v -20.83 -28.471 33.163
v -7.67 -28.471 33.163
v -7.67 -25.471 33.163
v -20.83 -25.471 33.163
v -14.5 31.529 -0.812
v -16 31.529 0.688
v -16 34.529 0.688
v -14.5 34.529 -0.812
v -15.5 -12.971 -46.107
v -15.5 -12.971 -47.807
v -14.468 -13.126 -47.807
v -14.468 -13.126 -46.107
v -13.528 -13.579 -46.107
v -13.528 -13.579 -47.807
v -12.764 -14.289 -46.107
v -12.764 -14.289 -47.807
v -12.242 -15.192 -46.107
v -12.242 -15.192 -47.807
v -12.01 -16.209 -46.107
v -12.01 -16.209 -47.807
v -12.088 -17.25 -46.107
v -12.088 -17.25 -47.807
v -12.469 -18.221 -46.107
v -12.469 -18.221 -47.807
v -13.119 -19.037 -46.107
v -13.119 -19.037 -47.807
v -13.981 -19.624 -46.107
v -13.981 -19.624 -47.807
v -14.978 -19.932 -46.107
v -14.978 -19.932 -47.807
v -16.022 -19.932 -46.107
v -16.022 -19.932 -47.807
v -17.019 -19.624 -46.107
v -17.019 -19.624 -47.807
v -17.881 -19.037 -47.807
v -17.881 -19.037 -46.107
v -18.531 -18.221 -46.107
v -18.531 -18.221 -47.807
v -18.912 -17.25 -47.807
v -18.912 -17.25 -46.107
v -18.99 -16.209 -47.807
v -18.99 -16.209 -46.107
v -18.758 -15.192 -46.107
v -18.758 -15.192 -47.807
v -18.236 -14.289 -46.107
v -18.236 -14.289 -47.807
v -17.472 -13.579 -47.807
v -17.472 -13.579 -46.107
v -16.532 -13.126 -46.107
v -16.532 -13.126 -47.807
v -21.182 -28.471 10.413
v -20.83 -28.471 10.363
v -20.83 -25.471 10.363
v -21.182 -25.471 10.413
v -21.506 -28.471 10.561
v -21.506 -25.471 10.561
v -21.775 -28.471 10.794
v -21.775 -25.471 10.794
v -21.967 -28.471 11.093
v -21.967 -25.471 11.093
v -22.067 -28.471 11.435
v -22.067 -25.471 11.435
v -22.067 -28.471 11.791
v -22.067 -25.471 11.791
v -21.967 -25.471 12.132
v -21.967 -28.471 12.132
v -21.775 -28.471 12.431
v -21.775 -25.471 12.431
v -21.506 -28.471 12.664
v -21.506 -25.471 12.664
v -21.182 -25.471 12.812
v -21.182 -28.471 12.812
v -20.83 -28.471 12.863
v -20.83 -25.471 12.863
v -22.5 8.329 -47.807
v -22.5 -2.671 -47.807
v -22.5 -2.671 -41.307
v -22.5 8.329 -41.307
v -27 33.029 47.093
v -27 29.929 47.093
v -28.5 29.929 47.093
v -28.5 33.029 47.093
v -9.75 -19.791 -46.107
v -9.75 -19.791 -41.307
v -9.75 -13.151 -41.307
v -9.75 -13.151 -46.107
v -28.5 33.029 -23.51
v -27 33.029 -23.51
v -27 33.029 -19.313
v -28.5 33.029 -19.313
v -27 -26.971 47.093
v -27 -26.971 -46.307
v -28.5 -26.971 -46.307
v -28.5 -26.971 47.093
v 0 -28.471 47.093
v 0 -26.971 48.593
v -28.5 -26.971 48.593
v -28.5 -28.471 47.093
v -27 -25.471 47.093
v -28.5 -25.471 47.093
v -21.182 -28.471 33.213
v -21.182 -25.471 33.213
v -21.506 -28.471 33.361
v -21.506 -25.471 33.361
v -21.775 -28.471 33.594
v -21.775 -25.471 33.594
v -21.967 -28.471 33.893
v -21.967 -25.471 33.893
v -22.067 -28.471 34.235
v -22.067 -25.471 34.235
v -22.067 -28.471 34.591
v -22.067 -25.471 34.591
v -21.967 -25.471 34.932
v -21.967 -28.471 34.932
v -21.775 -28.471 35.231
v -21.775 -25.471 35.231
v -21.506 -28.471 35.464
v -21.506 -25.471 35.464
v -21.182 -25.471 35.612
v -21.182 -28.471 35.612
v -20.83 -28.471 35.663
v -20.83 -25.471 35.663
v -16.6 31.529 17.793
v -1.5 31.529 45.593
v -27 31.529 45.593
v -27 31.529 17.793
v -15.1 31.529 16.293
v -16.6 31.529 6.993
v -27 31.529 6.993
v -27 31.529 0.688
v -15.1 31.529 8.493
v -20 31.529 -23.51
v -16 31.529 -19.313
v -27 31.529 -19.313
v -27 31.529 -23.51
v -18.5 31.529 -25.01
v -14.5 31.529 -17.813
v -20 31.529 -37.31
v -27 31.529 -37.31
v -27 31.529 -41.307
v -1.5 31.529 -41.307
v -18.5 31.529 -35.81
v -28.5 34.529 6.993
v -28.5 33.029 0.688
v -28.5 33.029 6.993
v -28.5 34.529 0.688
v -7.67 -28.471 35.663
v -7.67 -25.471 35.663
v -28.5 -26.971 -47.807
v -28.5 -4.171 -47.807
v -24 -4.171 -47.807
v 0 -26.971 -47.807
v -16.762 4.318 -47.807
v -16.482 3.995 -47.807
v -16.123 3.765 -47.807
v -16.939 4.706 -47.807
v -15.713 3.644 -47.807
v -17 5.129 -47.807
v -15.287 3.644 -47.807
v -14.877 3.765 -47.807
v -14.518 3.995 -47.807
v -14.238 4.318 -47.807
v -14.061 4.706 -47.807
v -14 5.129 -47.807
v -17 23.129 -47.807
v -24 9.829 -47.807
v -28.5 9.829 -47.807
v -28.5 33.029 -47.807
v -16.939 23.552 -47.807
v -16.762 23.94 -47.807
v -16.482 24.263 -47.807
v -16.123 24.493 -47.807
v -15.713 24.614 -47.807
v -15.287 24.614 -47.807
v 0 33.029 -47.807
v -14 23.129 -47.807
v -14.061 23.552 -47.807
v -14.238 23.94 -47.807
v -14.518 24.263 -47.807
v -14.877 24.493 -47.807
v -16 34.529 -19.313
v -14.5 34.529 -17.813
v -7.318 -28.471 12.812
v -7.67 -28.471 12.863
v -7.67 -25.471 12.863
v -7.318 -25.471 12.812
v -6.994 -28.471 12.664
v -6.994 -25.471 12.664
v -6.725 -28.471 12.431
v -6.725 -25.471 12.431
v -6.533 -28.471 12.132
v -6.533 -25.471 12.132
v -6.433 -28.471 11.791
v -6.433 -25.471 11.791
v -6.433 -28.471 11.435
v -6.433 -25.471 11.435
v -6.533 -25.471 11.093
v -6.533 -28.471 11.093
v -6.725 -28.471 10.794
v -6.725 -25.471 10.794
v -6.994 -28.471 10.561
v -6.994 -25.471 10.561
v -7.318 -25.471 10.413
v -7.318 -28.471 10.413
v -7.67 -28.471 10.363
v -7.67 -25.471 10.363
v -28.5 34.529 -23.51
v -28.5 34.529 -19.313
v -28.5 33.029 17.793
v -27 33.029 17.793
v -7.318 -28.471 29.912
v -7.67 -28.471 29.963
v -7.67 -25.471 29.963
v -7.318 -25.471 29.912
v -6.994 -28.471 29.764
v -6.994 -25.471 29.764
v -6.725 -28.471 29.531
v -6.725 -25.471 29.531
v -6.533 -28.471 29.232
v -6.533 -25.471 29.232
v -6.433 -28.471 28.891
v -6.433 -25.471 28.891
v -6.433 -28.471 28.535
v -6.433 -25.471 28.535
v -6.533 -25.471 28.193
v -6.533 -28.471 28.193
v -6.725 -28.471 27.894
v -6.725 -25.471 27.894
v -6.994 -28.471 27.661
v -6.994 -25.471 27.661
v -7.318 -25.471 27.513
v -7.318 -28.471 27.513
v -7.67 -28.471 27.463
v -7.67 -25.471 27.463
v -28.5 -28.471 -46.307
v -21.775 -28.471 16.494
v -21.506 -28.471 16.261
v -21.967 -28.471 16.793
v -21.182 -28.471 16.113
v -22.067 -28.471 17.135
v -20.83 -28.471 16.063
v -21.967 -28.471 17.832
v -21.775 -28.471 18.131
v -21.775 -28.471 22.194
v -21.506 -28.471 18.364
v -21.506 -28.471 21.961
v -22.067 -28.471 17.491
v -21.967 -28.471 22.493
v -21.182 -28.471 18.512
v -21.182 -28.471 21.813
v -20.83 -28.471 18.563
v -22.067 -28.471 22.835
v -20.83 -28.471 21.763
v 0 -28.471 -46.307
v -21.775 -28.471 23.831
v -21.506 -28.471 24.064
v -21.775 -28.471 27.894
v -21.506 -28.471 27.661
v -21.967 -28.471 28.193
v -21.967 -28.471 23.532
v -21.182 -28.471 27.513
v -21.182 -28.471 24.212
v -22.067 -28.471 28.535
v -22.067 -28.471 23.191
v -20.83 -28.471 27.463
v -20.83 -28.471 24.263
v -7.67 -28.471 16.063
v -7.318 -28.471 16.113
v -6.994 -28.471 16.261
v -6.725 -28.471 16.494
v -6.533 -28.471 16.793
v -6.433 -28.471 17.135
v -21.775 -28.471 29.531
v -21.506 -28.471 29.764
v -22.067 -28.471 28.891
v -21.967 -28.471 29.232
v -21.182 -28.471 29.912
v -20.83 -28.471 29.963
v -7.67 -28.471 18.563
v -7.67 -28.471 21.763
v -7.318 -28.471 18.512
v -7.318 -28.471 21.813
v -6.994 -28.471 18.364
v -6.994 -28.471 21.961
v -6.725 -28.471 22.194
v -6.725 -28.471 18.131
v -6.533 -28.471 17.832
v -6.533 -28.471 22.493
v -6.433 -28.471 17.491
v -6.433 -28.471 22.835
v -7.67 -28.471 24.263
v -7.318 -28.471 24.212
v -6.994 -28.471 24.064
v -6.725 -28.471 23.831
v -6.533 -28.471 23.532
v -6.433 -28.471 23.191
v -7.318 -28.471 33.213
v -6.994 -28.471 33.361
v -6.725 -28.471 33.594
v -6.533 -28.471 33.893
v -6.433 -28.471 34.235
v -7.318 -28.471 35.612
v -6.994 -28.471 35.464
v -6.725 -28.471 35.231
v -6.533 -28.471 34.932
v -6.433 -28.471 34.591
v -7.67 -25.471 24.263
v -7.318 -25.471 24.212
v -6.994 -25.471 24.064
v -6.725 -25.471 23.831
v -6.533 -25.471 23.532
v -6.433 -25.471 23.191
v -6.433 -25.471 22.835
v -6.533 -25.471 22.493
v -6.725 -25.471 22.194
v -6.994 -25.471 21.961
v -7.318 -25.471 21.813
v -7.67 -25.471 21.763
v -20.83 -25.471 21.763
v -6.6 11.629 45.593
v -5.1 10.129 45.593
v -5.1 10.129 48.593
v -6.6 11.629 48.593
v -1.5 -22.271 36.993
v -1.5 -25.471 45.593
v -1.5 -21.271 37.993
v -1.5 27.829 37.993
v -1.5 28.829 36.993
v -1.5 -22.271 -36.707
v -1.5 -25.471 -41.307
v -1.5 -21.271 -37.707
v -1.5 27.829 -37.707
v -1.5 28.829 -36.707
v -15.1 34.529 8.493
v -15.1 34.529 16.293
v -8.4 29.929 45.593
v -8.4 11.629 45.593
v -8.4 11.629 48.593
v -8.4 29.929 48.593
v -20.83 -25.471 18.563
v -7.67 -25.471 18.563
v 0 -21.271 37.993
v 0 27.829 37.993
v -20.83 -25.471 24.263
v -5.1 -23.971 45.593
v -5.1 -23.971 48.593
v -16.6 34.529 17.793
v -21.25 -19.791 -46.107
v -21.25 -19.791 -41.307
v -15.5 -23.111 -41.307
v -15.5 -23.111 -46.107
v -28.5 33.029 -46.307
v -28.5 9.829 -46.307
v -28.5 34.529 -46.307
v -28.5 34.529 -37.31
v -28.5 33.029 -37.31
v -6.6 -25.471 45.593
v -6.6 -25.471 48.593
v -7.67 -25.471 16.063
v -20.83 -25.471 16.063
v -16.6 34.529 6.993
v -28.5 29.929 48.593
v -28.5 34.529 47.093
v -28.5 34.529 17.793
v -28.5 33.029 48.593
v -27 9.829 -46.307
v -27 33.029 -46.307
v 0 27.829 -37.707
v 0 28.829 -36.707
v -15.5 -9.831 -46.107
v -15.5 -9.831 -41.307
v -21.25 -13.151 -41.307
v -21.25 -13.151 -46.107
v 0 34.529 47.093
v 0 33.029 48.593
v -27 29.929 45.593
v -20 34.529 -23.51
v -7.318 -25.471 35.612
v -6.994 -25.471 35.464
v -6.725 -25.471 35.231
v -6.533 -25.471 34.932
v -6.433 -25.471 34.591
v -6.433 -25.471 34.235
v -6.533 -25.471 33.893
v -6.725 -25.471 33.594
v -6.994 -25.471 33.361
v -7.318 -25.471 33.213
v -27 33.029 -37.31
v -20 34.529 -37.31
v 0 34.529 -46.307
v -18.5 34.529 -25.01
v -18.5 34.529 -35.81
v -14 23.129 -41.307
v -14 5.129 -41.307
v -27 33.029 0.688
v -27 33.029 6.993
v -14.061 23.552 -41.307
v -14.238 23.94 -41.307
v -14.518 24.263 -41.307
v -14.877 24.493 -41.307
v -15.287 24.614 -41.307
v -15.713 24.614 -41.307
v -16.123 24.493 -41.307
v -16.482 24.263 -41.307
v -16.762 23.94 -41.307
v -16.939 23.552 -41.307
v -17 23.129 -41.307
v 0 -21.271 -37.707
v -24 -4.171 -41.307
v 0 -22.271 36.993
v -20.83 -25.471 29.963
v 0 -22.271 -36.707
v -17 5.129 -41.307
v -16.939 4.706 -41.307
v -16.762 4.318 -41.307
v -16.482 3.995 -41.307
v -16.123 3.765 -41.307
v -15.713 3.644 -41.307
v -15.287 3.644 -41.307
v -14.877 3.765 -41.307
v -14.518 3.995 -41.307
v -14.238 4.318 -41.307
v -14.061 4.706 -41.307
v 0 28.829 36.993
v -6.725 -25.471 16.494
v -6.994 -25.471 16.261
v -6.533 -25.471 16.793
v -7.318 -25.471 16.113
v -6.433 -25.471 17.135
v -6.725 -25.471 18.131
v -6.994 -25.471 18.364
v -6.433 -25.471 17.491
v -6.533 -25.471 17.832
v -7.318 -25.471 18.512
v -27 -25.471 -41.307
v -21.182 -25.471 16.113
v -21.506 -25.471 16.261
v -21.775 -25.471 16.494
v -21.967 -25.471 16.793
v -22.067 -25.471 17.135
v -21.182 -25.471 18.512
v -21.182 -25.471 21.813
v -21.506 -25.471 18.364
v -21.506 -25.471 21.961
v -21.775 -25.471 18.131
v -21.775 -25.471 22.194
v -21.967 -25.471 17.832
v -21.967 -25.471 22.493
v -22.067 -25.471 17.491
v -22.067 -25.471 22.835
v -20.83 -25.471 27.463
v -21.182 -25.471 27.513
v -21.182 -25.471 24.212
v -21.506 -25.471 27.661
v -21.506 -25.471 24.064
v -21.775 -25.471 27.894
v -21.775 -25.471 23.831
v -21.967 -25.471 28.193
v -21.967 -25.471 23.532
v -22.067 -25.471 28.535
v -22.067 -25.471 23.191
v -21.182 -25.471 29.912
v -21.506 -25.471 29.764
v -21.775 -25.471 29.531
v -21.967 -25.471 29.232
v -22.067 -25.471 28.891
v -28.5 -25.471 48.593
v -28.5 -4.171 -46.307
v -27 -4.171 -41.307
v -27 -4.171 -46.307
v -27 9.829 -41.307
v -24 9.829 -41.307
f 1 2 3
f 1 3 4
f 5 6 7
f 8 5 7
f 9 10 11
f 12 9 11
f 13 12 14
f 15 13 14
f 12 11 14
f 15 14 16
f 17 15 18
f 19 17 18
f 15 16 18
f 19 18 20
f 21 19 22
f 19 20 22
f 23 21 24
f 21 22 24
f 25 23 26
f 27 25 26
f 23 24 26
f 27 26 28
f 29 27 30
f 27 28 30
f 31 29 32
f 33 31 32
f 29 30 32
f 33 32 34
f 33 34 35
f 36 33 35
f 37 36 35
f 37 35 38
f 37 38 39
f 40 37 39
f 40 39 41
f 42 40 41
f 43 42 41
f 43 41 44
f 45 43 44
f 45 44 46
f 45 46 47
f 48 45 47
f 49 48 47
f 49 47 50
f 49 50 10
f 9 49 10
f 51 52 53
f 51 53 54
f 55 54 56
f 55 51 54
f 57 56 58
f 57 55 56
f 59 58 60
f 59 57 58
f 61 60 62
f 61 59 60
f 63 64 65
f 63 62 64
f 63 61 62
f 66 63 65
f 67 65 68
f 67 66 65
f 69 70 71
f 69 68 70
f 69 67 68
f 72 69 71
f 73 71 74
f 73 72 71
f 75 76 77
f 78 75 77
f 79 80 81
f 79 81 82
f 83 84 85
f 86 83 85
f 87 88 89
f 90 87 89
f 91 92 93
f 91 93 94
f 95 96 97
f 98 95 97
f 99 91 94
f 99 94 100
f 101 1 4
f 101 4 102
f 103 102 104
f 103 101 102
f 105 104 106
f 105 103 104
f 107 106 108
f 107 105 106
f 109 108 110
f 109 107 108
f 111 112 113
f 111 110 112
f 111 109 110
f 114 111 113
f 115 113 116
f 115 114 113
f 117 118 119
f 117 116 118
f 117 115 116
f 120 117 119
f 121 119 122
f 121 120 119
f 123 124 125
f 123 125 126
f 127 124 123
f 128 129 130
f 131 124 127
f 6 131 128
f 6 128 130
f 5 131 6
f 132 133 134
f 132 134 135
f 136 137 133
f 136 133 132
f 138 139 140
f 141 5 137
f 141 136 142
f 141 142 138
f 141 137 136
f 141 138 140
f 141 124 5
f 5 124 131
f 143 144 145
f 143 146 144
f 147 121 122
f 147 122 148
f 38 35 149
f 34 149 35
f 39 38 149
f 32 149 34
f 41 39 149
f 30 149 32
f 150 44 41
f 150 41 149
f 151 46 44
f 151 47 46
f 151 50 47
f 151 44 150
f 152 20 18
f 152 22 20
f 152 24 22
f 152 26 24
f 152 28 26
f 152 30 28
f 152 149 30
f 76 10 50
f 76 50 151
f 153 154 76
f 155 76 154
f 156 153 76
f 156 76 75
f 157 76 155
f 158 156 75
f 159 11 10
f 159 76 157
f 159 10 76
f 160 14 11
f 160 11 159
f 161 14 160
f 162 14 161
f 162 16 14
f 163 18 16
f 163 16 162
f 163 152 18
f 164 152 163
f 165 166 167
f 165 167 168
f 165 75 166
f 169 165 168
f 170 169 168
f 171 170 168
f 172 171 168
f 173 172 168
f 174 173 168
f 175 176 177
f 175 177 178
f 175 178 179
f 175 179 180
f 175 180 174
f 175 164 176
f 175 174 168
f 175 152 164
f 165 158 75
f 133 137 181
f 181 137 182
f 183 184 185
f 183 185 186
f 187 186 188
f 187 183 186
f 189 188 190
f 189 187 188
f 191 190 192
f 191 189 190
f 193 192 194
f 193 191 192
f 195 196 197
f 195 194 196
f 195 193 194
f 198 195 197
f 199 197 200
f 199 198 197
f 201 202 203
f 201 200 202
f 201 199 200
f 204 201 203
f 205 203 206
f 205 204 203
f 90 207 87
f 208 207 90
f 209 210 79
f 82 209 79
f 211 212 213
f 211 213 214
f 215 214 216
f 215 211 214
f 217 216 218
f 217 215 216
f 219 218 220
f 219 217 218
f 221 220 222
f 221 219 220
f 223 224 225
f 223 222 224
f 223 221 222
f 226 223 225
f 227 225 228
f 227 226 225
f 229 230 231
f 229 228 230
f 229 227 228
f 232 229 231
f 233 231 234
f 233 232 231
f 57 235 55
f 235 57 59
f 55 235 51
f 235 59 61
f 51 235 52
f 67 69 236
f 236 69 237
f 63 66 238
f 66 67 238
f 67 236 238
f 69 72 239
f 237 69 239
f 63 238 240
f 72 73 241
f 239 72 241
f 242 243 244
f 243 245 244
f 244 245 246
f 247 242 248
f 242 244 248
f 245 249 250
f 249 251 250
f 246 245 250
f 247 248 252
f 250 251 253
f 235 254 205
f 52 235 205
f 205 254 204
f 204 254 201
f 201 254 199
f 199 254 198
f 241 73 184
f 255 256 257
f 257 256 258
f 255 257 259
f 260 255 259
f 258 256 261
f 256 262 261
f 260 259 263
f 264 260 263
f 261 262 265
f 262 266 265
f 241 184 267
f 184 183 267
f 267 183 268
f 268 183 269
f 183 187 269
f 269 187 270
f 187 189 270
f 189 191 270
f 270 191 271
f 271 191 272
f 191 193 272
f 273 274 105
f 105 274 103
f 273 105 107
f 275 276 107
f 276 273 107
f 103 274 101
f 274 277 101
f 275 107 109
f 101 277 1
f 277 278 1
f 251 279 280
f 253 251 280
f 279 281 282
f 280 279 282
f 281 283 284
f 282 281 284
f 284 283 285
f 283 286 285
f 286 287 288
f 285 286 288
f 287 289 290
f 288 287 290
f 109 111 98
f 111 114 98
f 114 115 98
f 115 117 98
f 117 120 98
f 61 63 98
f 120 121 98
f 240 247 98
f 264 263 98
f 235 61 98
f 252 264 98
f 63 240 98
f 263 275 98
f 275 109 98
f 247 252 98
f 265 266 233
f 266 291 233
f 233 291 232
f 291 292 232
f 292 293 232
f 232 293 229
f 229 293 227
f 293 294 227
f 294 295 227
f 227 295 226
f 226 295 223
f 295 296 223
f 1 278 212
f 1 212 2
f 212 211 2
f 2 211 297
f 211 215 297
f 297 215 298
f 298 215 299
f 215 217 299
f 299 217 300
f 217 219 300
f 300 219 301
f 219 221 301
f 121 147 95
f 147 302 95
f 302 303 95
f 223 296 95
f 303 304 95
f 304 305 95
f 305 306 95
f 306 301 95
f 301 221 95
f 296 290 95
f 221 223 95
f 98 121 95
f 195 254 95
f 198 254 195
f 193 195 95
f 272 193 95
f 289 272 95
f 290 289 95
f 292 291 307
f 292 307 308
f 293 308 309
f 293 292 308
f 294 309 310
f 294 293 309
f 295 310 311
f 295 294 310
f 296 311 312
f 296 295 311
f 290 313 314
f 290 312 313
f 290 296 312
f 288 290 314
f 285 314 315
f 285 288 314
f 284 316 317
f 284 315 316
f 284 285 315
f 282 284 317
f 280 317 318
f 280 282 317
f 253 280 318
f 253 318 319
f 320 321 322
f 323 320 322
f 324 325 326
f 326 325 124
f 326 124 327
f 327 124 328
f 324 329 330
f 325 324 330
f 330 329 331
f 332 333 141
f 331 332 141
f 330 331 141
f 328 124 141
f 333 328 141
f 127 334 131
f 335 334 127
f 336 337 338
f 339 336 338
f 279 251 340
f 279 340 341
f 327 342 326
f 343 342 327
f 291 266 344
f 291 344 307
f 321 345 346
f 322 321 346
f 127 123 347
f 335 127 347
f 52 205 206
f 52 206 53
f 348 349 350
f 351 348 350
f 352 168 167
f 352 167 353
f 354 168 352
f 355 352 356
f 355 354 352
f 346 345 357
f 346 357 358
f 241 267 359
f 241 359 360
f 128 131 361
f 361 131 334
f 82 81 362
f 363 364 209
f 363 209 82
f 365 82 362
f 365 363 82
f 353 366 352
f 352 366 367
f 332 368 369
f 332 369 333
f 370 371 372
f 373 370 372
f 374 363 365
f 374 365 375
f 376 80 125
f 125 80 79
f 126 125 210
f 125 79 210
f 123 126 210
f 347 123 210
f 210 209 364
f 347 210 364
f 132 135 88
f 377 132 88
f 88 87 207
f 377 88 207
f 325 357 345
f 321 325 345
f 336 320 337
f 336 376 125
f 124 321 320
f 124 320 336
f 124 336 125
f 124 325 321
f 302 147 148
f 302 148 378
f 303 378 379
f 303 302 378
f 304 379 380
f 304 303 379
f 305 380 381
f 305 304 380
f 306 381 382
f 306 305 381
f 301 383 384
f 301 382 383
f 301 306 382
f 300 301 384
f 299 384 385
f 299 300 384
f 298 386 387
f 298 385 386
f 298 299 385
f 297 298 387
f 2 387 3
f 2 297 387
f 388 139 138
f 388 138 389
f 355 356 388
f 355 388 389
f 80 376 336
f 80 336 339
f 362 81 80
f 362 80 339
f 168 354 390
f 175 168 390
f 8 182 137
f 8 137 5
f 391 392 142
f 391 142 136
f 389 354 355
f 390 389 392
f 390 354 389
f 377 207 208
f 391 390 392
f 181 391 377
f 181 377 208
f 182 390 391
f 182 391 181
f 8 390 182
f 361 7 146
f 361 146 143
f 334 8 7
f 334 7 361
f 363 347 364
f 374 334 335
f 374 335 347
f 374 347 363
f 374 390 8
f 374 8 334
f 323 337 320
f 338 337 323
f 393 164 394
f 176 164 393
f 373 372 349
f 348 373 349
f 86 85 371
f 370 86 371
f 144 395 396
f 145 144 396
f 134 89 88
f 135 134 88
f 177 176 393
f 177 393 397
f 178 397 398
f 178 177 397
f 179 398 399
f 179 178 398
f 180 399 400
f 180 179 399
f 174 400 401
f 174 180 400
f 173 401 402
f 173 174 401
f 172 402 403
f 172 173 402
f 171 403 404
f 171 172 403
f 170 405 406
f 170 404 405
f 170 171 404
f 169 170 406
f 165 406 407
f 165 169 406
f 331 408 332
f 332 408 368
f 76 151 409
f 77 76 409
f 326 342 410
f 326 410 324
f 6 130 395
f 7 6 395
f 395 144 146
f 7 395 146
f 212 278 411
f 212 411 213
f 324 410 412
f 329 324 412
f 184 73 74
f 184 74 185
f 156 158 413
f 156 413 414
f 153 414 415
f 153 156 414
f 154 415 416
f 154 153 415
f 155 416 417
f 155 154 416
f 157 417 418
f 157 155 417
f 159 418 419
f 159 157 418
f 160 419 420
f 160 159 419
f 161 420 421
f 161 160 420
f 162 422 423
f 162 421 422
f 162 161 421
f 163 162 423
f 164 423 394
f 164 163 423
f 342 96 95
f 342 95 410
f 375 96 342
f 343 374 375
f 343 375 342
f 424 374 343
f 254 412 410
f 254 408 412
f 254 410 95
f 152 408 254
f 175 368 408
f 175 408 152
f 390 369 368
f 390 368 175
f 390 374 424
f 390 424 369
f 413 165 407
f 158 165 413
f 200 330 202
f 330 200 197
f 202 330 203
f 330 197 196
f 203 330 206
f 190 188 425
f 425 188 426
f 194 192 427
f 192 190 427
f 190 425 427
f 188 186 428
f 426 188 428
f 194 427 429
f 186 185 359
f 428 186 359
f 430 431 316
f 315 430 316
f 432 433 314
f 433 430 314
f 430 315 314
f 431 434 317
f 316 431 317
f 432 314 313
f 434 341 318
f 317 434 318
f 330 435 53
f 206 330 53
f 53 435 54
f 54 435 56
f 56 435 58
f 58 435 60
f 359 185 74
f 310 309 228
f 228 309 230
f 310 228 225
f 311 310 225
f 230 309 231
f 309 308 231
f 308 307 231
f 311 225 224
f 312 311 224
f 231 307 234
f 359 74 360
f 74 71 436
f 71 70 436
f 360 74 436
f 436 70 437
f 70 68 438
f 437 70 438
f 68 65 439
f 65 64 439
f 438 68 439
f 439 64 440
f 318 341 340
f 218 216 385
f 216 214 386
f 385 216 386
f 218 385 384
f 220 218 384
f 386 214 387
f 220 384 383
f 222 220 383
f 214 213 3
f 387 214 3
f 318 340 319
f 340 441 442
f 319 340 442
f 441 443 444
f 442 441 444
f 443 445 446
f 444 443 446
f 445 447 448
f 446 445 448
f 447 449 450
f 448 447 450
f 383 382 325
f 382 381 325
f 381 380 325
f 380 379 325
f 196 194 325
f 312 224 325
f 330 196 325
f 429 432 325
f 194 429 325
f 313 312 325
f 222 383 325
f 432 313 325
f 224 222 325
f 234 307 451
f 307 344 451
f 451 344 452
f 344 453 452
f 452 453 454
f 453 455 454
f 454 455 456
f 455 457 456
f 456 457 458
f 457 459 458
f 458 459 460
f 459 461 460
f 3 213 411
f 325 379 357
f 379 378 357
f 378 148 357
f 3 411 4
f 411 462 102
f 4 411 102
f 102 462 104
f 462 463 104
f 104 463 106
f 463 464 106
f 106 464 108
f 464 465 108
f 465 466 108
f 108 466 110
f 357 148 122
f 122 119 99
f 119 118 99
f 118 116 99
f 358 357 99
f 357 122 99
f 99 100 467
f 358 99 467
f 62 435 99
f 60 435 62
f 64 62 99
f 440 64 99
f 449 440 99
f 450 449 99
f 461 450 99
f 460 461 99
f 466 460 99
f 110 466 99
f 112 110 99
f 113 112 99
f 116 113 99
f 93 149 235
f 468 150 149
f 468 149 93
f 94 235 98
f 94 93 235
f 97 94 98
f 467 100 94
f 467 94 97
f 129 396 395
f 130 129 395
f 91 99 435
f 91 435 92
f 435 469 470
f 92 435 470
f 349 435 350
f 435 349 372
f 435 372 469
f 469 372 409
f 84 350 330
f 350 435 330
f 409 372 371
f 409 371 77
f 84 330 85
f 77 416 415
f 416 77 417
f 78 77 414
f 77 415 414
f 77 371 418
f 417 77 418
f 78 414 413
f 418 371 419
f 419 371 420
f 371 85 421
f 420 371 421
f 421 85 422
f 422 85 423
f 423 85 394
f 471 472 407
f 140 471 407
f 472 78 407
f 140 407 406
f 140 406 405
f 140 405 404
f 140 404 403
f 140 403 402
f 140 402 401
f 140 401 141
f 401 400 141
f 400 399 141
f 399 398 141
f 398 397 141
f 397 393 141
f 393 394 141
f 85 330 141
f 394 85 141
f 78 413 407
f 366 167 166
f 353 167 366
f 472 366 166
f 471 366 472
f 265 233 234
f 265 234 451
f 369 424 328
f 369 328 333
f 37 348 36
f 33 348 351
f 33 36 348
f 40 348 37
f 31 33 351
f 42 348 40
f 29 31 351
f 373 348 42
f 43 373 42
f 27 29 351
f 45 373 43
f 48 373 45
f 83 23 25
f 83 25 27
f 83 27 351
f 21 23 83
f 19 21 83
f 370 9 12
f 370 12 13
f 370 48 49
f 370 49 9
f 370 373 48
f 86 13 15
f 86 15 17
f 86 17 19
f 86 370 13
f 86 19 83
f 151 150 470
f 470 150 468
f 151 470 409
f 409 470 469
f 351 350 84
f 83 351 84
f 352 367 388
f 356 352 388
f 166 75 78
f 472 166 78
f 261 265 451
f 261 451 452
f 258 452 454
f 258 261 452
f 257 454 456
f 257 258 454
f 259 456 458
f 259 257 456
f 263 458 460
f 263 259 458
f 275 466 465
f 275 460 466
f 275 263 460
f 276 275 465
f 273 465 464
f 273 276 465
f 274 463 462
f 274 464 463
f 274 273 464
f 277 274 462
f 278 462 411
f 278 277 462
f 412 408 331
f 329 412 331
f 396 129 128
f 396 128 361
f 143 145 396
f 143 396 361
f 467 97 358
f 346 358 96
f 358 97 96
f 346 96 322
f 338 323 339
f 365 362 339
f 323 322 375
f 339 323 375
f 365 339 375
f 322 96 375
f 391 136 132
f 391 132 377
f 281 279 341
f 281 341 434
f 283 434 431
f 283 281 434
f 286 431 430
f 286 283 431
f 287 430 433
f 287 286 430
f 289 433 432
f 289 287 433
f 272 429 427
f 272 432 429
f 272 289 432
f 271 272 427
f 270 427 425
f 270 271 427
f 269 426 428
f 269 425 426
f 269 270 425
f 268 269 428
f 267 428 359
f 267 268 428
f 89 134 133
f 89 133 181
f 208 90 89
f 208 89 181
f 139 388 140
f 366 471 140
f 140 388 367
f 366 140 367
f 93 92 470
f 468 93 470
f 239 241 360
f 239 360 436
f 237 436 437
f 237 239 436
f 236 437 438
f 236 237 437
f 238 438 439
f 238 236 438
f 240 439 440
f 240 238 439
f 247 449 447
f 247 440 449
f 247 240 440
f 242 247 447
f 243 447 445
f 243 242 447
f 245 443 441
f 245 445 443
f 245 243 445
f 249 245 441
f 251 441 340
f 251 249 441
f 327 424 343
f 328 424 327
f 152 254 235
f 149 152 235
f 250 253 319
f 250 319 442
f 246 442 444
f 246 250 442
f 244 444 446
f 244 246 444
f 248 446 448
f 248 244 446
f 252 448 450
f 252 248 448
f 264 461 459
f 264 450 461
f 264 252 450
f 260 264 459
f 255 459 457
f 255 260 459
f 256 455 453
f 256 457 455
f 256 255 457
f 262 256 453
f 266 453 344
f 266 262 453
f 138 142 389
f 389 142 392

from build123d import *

# Parameters (mm, degrees)
SKETCH2_W           = 86.9
SKETCH2_H           = 57
SKETCH2_W_2         = 75.7
SKETCH2_H_2         = 51.1
BOSS_EXTRUDE2_DEPTH = 1.5
SKETCH2_3_W         = 96.4
SKETCH2_3_H         = 63
SKETCH2_3_W_2       = 86.9
SKETCH2_3_H_2       = 57
BOSS_EXTRUDE3_DEPTH = 27
CHAMFER1_SIZE       = 1
SKETCH3_W           = 96.4
SKETCH3_H           = 63
SKETCH3_W_2         = 93.4
SKETCH3_H_2         = 60
BOSS_EXTRUDE4_DEPTH = 1.5
CHAMFER2_SIZE       = 1.5
SKETCH6_W           = 9.728035046
SKETCH6_H           = 14
CUT_EXTRUDE1_DEPTH  = 6
SKETCH10_W          = 3
SKETCH10_H          = 37.1
CUT_EXTRUDE2_DEPTH  = 23.4
SKETCH11_W          = 3.109966679
SKETCH11_H          = 18.3
CUT_EXTRUDE6_DEPTH  = 20.1
SKETCH12_W          = 13.8
SKETCH12_H          = 3.233091644
CUT_EXTRUDE7_DEPTH  = 10
SKETCH13_W          = 20.000720153
SKETCH13_H          = 4.04568645
CUT_EXTRUDE8_DEPTH  = 14
SKETCH15_W          = 10.8
SKETCH15_H          = 3.606090768
CUT_EXTRUDE9_DEPTH  = 13.4
CHAMFER3_SIZE       = 1.5
CHAMFER4_SIZE       = 1.5
CHAMFER5_SIZE       = 1.5
CHAMFER6_SIZE       = 1.5
CHAMFER7_SIZE       = 1.5
CUT_EXTRUDE11_DEPTH = 4
CUT_EXTRUDE12_DEPTH = 8
CUT_EXTRUDE13_DEPTH = 10
CUT_EXTRUDE14_DEPTH = 4.8


with BuildPart() as part:
    # Sketch2 → Boss-Extrude2 (new body)
    with BuildSketch(Plane(origin=(0, 0, 0), x_dir=(0, 0, -1), z_dir=(1, 0, 0))):
        with Locations((-2.142915598, 3.029012225)):
            Rectangle(SKETCH2_W, SKETCH2_H)
        with Locations((-0.142915598, 3.279012225)):
            Rectangle(SKETCH2_W_2, SKETCH2_H_2, mode=Mode.SUBTRACT)
    extrude(amount=-BOSS_EXTRUDE2_DEPTH)

    # Sketch2<3> → Boss-Extrude3 (add)
    with BuildSketch(Plane(origin=(0, 0, 0), x_dir=(0, 0, -1), z_dir=(1, 0, 0))):
        with Locations((-0.392915598, 3.029012225)):
            Rectangle(SKETCH2_3_W, SKETCH2_3_H)
        with Locations((-2.142915598, 3.029012225)):
            Rectangle(SKETCH2_3_W_2, SKETCH2_3_H_2, mode=Mode.SUBTRACT)
    extrude(amount=-BOSS_EXTRUDE3_DEPTH)

    # Chamfer1
    chamfer1_edges = [part.edges().sort_by_distance(p)[0] for p in [
        (-0.75, -22.270987775, -37.707084402),
        (-0.75, -22.270987775, 37.992915598),
        (-0.75, 28.829012225, 37.992915598),
        (-0.75, 28.829012225, -37.707084402),
    ]]
    chamfer(chamfer1_edges, length=CHAMFER1_SIZE)

    # Sketch3 → Boss-Extrude4 (add)
    with BuildSketch(Plane.ZY.offset(27)):
        with Locations((0.392915598, 3.029012225)):
            Rectangle(SKETCH3_W, SKETCH3_H)
        with Locations((0.392915598, 3.029012225)):
            Rectangle(SKETCH3_W_2, SKETCH3_H_2, mode=Mode.SUBTRACT)
    extrude(amount=BOSS_EXTRUDE4_DEPTH)

    # Chamfer2
    chamfer2_edges = [part.edges().sort_by_distance(p)[0] for p in [
        (-14.25, -28.470987775, 48.592915598),
        (-14.25, 34.529012225, 48.592915598),
        (-14.25, -28.470987775, -47.807084402),
        (-14.25, 34.529012225, -47.807084402),
    ]]
    chamfer(chamfer2_edges, length=CHAMFER2_SIZE)

    # Sketch6 → Cut-Extrude1 (cut)
    with BuildSketch(Plane.ZY.offset(28.5)):
        with Locations((-46.171101925, 2.829012225)):
            Rectangle(SKETCH6_W, SKETCH6_H)
    extrude(amount=-CUT_EXTRUDE1_DEPTH, mode=Mode.SUBTRACT)

    # Sketch10 → Cut-Extrude2 (cut)
    with BuildSketch(Plane.ZY.offset(28.5)):
        with Locations((47.092915598, -6.920987775)):
            Rectangle(SKETCH10_W, SKETCH10_H)
    extrude(amount=-CUT_EXTRUDE2_DEPTH, mode=Mode.SUBTRACT)

    # Sketch11 → Cut-Extrude6 (cut)
    with BuildSketch(Plane.ZY.offset(28.5)):
        with Locations((47.037932259, 20.779012225)):
            Rectangle(SKETCH11_W, SKETCH11_H)
    extrude(amount=-CUT_EXTRUDE6_DEPTH, mode=Mode.SUBTRACT)

    # Sketch12 → Cut-Extrude7 (cut)
    with BuildSketch(Plane.ZY.offset(28.5)):
        with Locations((-30.410119612, 32.912466403)):
            Rectangle(SKETCH12_W, SKETCH12_H)
    extrude(amount=-CUT_EXTRUDE7_DEPTH, mode=Mode.SUBTRACT)

    # Sketch13 → Cut-Extrude8 (cut)
    with BuildSketch(Plane.ZY.offset(28.5)):
        with Locations((-9.312541512, 33.035392559)):
            Rectangle(SKETCH13_W, SKETCH13_H)
    extrude(amount=-CUT_EXTRUDE8_DEPTH, mode=Mode.SUBTRACT)

    # Sketch15 → Cut-Extrude9 (cut)
    with BuildSketch(Plane.ZY.offset(28.5)):
        with Locations((12.393292701, 33.319062827)):
            Rectangle(SKETCH15_W, SKETCH15_H)
    extrude(amount=-CUT_EXTRUDE9_DEPTH, mode=Mode.SUBTRACT)

    # Chamfer3
    chamfer3_edges = [part.edges().sort_by_distance(p)[0] for p in [
        (-18.5, 33.029012225, -37.310119612),
        (-18.5, 33.029012225, -23.510119612),
    ]]
    chamfer(chamfer3_edges, length=CHAMFER3_SIZE)

    # Chamfer4
    chamfer4_edges = [part.edges().sort_by_distance(p)[0] for p in [
        (-14.5, 33.029012225, -19.312901588),
        (-14.5, 33.029012225, 0.687818565),
    ]]
    chamfer(chamfer4_edges, length=CHAMFER4_SIZE)

    # Chamfer5
    chamfer5_edges = [part.edges().sort_by_distance(p)[0] for p in [
        (-15.1, 33.029012225, 6.993292701),
        (-15.1, 33.029012225, 17.793292701),
    ]]
    chamfer(chamfer5_edges, length=CHAMFER5_SIZE)

    # Chamfer6
    chamfer6_edges = [part.edges().sort_by_distance(p)[0] for p in [
        (-22.5, 9.829012225, -44.557084402),
        (-22.5, -4.170987775, -44.557084402),
    ]]
    chamfer(chamfer6_edges, length=CHAMFER6_SIZE)

    # Chamfer7
    chamfer7_edges = [part.edges().sort_by_distance(p)[0] for p in [
        (-5.1, -25.470987775, 47.092915598),
        (-5.1, 11.629012225, 47.092915598),
    ]]
    chamfer(chamfer7_edges, length=CHAMFER7_SIZE)

    # Sketch17 → Cut-Extrude11 (cut)
    with BuildSketch(Plane.XZ.offset(28.470987775)):
        with BuildLine():
            Line((-7.669966397, 35.662637039), (-20.830033603, 35.662637039))
            ThreePointArc((-20.830033603, 35.662637039), (-22.080033603, 34.412637039), (-20.830033603, 33.162637039))
            Line((-20.830033603, 33.162637039), (-7.669966397, 33.162637039))
            ThreePointArc((-7.669966397, 33.162637039), (-6.419966397, 34.412637039), (-7.669966397, 35.662637039))
        make_face()
        with BuildLine():
            Line((-7.669966397, 29.962637039), (-20.830033603, 29.962637039))
            ThreePointArc((-20.830033603, 29.962637039), (-22.080033603, 28.712637039), (-20.830033603, 27.462637039))
            Line((-20.830033603, 27.462637039), (-7.669966397, 27.462637039))
            ThreePointArc((-7.669966397, 27.462637039), (-6.419966397, 28.712637039), (-7.669966397, 29.962637039))
        make_face()
        with BuildLine():
            Line((-7.669966397, 24.262637039), (-20.830033603, 24.262637039))
            ThreePointArc((-20.830033603, 24.262637039), (-22.080033603, 23.012637039), (-20.830033603, 21.762637039))
            Line((-20.830033603, 21.762637039), (-7.669966397, 21.762637039))
            ThreePointArc((-7.669966397, 21.762637039), (-6.419966397, 23.012637039), (-7.669966397, 24.262637039))
        make_face()
        with BuildLine():
            Line((-7.669966397, 18.562637039), (-20.830033603, 18.562637039))
            ThreePointArc((-20.830033603, 18.562637039), (-22.080033603, 17.312637039), (-20.830033603, 16.062637039))
            Line((-20.830033603, 16.062637039), (-7.669966397, 16.062637039))
            ThreePointArc((-7.669966397, 16.062637039), (-6.419966397, 17.312637039), (-7.669966397, 18.562637039))
        make_face()
        with BuildLine():
            Line((-7.669966397, 12.862637039), (-20.830033603, 12.862637039))
            ThreePointArc((-20.830033603, 12.862637039), (-22.080033603, 11.612637039), (-20.830033603, 10.362637039))
            Line((-20.830033603, 10.362637039), (-7.669966397, 10.362637039))
            ThreePointArc((-7.669966397, 10.362637039), (-6.419966397, 11.612637039), (-7.669966397, 12.862637039))
        make_face()
    extrude(amount=-CUT_EXTRUDE11_DEPTH, mode=Mode.SUBTRACT)

    # Sketch18 → Cut-Extrude12 (cut)
    with BuildSketch(Plane(origin=(0, 0, -47.807084402), x_dir=(-1, 0, 0), z_dir=(0, 0, -1))):
        with BuildLine():
            Line((17, 23.129012225), (17, 5.129012225))
            ThreePointArc((17, 5.129012225), (15.5, 3.629012225), (14, 5.129012225))
            Line((14, 5.129012225), (14, 23.129012225))
            ThreePointArc((14, 23.129012225), (15.5, 24.629012225), (17, 23.129012225))
        make_face()
    extrude(amount=-CUT_EXTRUDE12_DEPTH, mode=Mode.SUBTRACT)

    # Sketch19 → Cut-Extrude13 (cut)
    with BuildSketch(Plane(origin=(0, 0, -47.807084402), x_dir=(-1, 0, 0), z_dir=(0, 0, -1))):
        with BuildLine():
            ThreePointArc((19, -16.470987775), (13.025126266, -13.996114041), (15.5, -19.970987775))
            ThreePointArc((15.5, -19.970987775), (17.974873734, -18.945861509), (19, -16.470987775))
        make_face()
    extrude(amount=-CUT_EXTRUDE13_DEPTH, mode=Mode.SUBTRACT)

    # Sketch21 → Cut-Extrude14 (cut)
    with BuildSketch(Plane.XY.offset(-41.307084402)):
        Polygon((-15.5, -23.110987775), (-9.749591319, -19.790987775), (-9.749591319, -13.150987775), (-15.5, -9.830987775), (-21.250408681, -13.150987775), (-21.250408681, -19.790987775), align=None)
    extrude(amount=-CUT_EXTRUDE14_DEPTH, mode=Mode.SUBTRACT)


solid = part.part
